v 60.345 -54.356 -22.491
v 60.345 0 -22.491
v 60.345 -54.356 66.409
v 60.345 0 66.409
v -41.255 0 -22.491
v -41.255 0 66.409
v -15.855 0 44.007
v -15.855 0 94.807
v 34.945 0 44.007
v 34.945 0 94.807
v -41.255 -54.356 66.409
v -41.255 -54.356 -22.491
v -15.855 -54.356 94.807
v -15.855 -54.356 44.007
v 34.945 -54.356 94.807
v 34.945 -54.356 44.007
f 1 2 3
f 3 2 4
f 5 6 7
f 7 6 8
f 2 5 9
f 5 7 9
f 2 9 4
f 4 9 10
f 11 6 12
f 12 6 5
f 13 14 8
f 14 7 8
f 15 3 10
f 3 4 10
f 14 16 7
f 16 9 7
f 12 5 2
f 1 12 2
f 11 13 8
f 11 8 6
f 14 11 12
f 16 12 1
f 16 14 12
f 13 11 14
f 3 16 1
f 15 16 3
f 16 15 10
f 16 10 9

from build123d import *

# Parameters (mm, degrees)
F0_W     = 25.4
F0_H     = 25.4
F0_W_2   = 50.8
F1_DEPTH = 25.4
F2_DEPTH = 28.956


with BuildPart() as f1:
    # F0 (on Front) → F1 (new body)
    with BuildSketch(Plane.XZ):
        with Locations((-28.554517, -9.791291)):
            Rectangle(F0_W, F0_H)
        with Locations((9.545483, -9.791291)):
            Rectangle(F0_W_2, F0_H)
        with Locations((47.645483, -9.791291)):
            Rectangle(F0_W, F0_H)
        Polygon((-41.254517, 66.408709), (-41.254517, 2.908709), (-15.854517, 2.908709), (34.945483, 2.908709), (60.345483, 2.908709), (60.345483, 66.408709), (34.945483, 94.806772), (34.945483, 44.006772), (-15.854517, 44.006772), (-15.854517, 94.806772), align=None)
    extrude(amount=F1_DEPTH)

    # F1_face (on face) → F2 (join)
    with BuildSketch(Plane(origin=(9.545483, -25.4, 22.080837), x_dir=(1, 0, 0), z_dir=(0, -1, 0))):
        Polygon((-50.8, -44.572128), (50.8, -44.572128), (50.8, 44.327872), (25.4, 72.725935), (25.4, 21.925935), (-25.4, 21.925935), (-25.4, 72.725935), (-50.8, 44.327872), align=None)
    extrude(amount=F2_DEPTH)


solid = f1.part
